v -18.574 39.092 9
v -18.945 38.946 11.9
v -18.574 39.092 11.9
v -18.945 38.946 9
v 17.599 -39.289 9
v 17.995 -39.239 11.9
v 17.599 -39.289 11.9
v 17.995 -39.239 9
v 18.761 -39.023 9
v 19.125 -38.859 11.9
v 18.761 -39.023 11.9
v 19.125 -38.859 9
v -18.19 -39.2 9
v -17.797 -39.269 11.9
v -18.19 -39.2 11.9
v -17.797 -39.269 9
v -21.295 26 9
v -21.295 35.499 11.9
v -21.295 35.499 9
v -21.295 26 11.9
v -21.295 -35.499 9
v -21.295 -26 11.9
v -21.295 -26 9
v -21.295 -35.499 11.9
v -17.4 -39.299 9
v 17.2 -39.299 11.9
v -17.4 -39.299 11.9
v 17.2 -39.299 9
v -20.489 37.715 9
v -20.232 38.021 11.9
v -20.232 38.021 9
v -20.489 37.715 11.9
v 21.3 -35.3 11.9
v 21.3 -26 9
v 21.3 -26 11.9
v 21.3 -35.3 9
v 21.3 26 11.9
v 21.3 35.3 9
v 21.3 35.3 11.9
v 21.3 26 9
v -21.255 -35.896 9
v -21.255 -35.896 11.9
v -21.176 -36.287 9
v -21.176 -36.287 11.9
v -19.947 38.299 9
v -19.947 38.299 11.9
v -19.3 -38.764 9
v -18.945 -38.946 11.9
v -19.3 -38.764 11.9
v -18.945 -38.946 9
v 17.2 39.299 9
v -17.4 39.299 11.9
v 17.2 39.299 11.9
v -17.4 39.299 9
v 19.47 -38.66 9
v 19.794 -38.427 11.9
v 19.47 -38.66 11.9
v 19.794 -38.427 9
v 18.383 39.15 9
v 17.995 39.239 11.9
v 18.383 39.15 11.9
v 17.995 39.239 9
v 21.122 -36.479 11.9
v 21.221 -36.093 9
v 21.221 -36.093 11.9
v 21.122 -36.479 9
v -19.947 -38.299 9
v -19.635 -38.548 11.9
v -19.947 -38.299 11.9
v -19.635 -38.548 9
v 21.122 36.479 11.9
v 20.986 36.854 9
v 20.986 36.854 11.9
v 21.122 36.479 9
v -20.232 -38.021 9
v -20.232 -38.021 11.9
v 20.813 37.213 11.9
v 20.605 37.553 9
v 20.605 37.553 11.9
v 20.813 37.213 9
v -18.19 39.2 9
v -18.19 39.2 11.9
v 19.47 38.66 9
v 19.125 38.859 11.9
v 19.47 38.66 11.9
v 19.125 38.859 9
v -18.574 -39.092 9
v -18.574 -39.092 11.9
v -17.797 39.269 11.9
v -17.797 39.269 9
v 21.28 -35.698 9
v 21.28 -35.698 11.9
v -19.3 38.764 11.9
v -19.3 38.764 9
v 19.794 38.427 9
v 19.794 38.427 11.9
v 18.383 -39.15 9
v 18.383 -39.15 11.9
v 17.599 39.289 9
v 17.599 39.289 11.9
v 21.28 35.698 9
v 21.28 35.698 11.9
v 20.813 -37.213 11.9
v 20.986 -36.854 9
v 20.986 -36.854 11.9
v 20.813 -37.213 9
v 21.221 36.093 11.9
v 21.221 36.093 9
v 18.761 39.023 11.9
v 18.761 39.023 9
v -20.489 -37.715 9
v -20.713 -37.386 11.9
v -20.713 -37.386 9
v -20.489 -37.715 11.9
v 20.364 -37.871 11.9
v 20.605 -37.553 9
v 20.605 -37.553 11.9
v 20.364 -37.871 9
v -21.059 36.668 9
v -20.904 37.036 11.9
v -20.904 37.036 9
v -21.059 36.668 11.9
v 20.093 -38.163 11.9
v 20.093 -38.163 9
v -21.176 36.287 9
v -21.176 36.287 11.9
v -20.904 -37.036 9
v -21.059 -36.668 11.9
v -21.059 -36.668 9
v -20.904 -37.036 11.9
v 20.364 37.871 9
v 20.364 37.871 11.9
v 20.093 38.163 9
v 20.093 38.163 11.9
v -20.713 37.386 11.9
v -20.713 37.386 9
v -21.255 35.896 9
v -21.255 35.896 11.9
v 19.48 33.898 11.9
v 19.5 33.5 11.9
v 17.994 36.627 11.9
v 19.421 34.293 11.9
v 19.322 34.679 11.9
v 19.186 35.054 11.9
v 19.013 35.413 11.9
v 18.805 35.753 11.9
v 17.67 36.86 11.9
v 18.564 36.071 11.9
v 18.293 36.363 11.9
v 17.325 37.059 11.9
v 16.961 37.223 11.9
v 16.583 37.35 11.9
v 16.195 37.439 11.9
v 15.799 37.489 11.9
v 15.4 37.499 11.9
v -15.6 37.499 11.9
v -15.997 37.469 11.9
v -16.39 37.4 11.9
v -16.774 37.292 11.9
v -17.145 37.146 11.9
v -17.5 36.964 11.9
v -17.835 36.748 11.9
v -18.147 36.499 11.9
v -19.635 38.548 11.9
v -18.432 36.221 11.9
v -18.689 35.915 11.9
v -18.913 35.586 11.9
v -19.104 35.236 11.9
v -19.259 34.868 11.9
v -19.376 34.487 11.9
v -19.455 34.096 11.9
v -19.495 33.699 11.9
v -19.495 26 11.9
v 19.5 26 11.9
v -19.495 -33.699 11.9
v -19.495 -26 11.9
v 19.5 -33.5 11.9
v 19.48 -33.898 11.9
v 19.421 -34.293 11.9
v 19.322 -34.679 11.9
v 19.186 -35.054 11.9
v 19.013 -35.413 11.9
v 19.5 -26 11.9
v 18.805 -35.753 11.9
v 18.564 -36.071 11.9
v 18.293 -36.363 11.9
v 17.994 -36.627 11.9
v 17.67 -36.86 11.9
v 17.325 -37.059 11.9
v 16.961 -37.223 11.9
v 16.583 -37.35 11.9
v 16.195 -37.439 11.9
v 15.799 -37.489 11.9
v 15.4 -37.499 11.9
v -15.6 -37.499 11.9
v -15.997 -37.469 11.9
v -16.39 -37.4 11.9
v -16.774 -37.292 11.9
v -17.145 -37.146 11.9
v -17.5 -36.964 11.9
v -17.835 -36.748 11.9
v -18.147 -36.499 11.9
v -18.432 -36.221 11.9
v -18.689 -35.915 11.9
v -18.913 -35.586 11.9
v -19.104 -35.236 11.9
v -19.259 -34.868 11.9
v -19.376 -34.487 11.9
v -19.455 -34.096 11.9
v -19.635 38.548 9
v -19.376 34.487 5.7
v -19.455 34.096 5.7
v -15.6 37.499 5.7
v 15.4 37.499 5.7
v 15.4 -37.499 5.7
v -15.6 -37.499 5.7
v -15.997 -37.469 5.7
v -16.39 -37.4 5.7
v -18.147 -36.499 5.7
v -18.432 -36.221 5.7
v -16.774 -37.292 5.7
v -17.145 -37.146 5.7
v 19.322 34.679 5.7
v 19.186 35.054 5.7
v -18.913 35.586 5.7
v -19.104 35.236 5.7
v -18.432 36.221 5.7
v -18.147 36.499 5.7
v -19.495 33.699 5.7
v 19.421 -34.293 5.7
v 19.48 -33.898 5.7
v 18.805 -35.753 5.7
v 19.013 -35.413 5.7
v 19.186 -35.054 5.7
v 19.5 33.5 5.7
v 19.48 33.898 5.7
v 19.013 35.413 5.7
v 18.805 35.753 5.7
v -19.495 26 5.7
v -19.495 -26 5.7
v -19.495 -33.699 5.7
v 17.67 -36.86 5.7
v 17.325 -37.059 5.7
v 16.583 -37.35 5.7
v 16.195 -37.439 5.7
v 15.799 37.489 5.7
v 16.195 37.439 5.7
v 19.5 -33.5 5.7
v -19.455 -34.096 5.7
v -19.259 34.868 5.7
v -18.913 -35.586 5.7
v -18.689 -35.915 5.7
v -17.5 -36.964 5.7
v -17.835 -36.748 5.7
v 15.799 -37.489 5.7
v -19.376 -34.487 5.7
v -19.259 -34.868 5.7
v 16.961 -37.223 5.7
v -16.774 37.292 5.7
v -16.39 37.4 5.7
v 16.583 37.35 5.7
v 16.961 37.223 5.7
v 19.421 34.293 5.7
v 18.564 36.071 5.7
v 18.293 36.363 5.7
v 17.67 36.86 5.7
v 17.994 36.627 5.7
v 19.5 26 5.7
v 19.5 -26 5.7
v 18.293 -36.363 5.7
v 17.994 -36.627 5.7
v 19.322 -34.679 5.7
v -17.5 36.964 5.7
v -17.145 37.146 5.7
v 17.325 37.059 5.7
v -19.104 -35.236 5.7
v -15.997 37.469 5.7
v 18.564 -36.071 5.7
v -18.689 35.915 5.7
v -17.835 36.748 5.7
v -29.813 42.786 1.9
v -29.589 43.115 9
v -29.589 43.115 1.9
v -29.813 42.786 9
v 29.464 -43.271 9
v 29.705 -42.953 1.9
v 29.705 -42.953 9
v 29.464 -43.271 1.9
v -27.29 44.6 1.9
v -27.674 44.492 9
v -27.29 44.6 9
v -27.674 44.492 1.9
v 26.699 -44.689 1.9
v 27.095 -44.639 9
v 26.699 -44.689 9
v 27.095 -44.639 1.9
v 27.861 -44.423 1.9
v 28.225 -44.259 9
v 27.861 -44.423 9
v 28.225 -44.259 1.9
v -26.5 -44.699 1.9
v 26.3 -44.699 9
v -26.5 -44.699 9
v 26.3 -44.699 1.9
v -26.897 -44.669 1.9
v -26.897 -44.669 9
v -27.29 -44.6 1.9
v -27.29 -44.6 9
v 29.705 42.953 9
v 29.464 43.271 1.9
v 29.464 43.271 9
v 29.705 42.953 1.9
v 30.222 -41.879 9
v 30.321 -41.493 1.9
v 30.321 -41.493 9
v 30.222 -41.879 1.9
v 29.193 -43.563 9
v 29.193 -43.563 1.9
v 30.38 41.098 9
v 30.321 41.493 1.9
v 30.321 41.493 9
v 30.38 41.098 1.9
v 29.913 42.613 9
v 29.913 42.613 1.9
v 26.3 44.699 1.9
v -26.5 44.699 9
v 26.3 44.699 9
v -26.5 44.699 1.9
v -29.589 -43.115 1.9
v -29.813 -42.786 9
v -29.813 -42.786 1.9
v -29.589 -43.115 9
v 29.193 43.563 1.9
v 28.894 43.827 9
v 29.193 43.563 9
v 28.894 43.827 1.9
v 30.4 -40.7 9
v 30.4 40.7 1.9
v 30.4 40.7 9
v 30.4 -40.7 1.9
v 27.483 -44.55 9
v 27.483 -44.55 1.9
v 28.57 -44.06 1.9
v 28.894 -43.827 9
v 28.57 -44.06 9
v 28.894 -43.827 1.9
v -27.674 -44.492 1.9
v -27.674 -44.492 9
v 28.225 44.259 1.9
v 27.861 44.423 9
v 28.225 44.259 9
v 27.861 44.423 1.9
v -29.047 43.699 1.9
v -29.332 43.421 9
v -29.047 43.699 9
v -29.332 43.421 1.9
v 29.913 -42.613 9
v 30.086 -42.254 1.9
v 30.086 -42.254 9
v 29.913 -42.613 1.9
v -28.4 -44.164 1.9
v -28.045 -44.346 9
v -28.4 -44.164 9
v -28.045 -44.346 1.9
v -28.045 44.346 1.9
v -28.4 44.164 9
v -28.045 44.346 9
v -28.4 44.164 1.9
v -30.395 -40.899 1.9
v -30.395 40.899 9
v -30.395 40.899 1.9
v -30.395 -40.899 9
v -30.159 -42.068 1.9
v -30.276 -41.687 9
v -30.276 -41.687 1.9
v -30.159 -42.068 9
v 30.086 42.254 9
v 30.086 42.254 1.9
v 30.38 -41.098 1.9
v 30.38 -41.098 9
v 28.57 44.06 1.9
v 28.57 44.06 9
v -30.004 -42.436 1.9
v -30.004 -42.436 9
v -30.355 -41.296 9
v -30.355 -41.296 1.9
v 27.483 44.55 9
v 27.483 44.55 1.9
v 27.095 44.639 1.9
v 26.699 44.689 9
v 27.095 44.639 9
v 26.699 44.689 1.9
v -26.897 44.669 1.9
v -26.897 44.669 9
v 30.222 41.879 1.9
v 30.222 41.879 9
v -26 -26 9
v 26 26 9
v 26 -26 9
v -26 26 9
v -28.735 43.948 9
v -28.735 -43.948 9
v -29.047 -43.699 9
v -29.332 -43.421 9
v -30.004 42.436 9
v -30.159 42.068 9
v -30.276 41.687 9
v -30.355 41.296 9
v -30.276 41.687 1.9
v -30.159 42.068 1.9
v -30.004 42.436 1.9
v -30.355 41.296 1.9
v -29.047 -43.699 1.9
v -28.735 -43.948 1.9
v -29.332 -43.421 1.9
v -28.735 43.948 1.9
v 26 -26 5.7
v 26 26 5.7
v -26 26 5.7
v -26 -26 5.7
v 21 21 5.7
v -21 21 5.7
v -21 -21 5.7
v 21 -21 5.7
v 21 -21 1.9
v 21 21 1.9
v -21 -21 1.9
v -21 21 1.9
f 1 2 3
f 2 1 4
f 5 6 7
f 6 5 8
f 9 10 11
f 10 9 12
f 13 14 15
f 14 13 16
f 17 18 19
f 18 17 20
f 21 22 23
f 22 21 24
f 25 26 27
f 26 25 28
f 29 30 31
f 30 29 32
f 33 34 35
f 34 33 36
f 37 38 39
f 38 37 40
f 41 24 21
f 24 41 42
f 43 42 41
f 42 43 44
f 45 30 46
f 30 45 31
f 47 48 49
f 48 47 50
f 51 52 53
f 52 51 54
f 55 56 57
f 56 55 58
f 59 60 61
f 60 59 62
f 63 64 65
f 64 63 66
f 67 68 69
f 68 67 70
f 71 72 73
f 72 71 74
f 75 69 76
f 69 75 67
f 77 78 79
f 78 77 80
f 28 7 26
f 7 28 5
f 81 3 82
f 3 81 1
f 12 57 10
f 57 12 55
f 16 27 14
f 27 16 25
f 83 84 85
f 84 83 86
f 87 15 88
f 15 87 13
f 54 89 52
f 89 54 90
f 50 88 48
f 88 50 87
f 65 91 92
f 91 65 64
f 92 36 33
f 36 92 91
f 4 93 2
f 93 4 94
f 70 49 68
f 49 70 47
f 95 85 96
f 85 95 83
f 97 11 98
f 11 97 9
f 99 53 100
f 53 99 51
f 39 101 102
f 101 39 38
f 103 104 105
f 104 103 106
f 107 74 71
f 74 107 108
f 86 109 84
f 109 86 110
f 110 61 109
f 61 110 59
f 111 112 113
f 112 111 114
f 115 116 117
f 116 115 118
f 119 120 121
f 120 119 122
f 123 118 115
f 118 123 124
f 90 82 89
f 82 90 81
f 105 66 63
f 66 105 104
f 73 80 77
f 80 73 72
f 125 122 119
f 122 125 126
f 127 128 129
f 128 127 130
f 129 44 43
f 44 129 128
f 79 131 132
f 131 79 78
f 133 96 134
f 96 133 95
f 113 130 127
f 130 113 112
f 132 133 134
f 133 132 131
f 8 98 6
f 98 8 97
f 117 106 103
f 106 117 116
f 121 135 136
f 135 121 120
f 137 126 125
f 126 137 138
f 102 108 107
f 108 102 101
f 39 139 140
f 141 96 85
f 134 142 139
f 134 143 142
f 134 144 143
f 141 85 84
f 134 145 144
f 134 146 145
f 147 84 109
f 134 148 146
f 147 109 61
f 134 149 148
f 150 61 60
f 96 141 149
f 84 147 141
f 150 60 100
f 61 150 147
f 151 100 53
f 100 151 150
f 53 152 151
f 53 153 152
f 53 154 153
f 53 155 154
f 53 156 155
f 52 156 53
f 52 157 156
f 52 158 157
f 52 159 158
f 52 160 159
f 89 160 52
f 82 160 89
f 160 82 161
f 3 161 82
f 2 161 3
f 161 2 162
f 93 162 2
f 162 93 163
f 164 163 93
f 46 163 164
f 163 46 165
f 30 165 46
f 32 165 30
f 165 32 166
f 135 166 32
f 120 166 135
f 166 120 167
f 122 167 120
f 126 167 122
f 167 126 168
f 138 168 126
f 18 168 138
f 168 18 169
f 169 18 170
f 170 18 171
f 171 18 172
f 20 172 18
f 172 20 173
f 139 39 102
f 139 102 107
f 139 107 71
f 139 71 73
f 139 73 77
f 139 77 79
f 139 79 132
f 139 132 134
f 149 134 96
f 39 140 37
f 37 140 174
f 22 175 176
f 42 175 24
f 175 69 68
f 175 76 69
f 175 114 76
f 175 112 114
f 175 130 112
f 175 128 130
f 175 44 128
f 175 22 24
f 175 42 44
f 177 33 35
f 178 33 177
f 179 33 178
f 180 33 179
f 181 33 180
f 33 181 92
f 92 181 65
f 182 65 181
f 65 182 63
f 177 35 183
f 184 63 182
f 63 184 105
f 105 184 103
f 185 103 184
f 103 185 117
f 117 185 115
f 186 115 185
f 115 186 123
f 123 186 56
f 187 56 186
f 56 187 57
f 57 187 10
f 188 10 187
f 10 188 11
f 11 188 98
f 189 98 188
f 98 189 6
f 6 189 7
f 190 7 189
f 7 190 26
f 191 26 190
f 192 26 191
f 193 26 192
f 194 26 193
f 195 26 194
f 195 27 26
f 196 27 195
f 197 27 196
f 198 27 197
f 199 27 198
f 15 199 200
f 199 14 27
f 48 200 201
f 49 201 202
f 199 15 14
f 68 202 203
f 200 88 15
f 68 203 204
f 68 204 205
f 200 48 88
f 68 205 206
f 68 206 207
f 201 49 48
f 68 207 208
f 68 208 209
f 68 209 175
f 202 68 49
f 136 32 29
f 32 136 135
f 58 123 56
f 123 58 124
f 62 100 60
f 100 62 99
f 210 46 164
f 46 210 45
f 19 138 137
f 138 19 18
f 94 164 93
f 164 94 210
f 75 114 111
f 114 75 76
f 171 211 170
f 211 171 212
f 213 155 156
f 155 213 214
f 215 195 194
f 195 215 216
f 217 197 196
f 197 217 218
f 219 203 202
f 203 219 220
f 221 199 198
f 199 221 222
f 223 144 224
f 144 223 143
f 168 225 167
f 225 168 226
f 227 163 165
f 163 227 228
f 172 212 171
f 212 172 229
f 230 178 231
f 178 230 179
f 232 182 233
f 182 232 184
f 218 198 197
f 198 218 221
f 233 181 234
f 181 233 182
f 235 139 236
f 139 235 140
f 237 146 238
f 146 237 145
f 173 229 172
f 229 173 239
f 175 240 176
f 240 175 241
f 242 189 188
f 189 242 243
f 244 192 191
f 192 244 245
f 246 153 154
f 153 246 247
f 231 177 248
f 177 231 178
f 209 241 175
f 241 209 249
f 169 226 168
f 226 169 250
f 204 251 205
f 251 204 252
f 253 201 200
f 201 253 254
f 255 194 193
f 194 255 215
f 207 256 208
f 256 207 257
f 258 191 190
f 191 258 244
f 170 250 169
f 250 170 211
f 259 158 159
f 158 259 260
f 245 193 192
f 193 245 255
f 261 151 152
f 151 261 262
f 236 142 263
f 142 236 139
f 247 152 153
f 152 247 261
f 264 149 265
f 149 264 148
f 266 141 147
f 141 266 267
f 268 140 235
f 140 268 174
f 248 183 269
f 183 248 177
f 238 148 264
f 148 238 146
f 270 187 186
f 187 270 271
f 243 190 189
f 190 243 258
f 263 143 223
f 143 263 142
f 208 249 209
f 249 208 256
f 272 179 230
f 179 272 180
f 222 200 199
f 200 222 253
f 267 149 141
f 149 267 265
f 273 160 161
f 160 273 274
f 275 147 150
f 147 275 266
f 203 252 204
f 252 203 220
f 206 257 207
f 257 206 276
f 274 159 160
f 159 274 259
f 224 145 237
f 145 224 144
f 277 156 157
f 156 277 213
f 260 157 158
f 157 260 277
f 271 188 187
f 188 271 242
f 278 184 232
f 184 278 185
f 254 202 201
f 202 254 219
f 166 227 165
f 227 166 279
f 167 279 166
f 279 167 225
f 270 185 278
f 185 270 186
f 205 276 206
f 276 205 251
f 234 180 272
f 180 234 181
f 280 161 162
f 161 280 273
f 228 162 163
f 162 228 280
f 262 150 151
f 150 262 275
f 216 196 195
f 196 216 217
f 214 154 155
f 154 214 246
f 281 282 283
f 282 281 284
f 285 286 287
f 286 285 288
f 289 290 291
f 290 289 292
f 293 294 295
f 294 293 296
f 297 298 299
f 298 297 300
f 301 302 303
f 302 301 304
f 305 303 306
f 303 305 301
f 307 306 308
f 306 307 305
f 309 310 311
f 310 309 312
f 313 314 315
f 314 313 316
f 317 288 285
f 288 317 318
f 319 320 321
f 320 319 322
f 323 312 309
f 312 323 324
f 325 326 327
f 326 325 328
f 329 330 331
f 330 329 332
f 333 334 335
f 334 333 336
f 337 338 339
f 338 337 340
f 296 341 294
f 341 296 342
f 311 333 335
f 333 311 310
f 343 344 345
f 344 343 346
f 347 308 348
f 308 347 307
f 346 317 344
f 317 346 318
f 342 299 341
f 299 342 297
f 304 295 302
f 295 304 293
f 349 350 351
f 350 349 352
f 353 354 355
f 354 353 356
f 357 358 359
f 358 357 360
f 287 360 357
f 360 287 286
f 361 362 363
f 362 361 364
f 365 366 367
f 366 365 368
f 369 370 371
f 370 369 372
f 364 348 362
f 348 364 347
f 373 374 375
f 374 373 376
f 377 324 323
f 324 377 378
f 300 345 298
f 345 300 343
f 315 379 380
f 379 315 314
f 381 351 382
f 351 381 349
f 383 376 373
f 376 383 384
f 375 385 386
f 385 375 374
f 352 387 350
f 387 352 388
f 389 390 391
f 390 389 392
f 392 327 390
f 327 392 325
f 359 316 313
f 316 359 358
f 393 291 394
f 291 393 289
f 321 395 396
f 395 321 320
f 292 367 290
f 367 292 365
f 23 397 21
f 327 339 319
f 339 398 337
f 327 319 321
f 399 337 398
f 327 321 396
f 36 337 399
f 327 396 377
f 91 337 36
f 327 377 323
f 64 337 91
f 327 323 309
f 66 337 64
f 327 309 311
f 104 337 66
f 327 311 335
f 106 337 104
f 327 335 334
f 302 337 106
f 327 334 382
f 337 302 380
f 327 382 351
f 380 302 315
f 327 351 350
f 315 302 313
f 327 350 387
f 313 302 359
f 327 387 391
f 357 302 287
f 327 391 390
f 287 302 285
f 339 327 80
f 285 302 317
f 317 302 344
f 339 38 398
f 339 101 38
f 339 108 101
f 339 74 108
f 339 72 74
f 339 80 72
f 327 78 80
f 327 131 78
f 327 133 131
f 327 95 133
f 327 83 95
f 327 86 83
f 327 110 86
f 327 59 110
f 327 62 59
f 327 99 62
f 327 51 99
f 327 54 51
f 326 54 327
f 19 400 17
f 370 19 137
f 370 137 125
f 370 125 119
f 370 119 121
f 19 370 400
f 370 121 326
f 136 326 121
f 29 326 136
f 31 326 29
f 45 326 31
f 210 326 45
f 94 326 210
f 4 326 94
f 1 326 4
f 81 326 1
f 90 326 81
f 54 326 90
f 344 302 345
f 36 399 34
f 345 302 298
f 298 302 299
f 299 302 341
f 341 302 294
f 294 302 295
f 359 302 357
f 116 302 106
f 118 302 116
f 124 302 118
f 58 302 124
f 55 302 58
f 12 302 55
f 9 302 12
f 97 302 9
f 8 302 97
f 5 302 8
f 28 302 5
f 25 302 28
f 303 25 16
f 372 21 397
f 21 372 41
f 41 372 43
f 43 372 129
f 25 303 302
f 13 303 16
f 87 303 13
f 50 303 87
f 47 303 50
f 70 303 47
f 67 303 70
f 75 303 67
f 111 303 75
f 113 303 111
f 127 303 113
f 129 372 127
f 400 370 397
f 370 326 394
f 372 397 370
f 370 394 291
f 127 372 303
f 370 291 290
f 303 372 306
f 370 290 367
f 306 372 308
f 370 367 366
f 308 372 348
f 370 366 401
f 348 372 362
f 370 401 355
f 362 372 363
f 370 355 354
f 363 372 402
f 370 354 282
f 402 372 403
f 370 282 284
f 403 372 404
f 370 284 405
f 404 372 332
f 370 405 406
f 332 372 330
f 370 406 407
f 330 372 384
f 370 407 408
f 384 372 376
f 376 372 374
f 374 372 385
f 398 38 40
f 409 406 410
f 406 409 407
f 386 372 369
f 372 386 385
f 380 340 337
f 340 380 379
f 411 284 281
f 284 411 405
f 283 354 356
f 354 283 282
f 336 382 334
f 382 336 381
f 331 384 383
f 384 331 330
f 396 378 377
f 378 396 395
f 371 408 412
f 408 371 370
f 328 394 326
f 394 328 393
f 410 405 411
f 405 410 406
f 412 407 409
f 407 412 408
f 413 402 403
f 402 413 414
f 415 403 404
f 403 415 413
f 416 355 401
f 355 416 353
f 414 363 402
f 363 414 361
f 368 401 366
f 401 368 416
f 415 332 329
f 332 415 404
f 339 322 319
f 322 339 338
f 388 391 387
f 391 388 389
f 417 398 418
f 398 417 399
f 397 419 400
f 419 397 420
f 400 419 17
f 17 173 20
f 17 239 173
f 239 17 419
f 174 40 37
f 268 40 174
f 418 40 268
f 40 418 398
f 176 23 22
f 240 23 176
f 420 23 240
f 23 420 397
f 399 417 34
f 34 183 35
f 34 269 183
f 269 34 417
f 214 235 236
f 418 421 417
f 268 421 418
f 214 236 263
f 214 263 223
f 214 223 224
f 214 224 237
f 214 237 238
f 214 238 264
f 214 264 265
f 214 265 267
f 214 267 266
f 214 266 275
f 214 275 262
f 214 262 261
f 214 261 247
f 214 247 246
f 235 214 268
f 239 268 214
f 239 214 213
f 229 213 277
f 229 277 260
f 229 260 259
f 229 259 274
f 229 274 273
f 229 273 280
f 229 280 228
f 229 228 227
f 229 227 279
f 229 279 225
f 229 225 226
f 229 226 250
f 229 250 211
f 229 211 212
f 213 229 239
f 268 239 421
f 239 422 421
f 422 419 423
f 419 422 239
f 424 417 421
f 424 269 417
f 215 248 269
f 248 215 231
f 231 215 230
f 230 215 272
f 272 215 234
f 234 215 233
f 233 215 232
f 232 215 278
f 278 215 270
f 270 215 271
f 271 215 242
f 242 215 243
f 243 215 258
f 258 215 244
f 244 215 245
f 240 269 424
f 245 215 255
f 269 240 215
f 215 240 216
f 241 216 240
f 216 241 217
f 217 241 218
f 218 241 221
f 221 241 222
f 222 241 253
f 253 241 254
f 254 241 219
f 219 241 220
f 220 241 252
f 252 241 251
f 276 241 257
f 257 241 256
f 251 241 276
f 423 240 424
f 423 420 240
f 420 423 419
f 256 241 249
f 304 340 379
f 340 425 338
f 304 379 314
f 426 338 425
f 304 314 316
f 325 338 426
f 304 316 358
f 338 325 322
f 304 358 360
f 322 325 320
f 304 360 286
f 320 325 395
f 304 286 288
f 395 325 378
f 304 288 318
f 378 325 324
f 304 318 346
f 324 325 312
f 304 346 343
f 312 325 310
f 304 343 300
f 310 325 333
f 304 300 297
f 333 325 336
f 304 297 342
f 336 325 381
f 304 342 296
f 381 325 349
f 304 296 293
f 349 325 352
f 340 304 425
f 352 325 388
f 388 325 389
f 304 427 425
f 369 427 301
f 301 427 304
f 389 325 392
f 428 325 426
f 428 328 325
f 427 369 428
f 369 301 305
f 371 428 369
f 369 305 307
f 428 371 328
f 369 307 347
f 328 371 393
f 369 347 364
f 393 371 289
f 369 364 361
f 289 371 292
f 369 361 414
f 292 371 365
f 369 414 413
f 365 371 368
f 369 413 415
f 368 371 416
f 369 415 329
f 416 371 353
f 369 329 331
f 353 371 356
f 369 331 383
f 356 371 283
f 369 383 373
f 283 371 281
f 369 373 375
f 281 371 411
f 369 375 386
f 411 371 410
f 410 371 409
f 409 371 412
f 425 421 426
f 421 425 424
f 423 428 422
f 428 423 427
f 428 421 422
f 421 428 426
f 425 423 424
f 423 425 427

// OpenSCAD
// increase fragment size for prettier cylinders
// $fn = 25;

// better resolution
$fa = 1;
$fs = 0.4;

// overlap
smalloverlap = 2;

// outside shape
outerx = 60.8;
outery = 89.4;
outerz = 3.8;

// raised edge (fits into piece above)
innerx = 42.6;
innery = 78.6;
innerz = 3.2;

// width of the raised edge
windowwidth = 1.8;

// inner dimensions of the raised edge
innerwindowx = innerx - windowwidth*2;
innerwindowy = innery - windowwidth*2;

// a height big enough to make a cut out with difference
cutoutz = 15;

// dimensions of the cutout for the slide
outer_slidexy = 52;
inner_slide_lip = 5;

// radius for the curved corners 
curveradius = 4;

// define modules

module rounded_rect_prism(x, y, z, r1) {
    hull() {
        translate([x/2 - r1, y/2 - r1, 0])
            cylinder(z, r1, r1, center = true);
        translate([-x/2 + r1, y/2 - r1, 0])
            cylinder(z, r1, r1, center = true);
        translate([-x/2 + r1, -y/2 + r1, 0])
            cylinder(z, r1, r1, center = true);
        translate([x/2 - r1, -y/2 + r1, 0])
            cylinder(z, r1, r1, center = true);
    }
}

module bottom() {
    difference() {
        // base plate
        rounded_rect_prism(outerx, outery, outerz, curveradius);
        // window for slide light
        cube([outer_slidexy - 2*inner_slide_lip, outer_slidexy - 2*inner_slide_lip, cutoutz], center = true);
    }
}

module connecting_lip() {
    difference() {
        rounded_rect_prism(innerx, innery, innerz + smalloverlap, curveradius);
        rounded_rect_prism(innerwindowx, innerwindowy, cutoutz, curveradius);
    }
}

module top() {
    difference() {
        // base plate
        union() {
            rounded_rect_prism(outerx, outery, outerz, curveradius);
            translate([0, 0, innerz - smalloverlap/2]) connecting_lip();
        }
        // cut out for fingies
        rounded_rect_prism(innerwindowx, innerwindowy, cutoutz, curveradius);
        // cut out for slide
        cube([outer_slidexy, outer_slidexy, cutoutz], center = true);
    }
}

// build it
        
     

union() {
    translate([0, 0, outerz*2 - smalloverlap/4]) top();
    translate([0, 0, outerz]) bottom();
}
